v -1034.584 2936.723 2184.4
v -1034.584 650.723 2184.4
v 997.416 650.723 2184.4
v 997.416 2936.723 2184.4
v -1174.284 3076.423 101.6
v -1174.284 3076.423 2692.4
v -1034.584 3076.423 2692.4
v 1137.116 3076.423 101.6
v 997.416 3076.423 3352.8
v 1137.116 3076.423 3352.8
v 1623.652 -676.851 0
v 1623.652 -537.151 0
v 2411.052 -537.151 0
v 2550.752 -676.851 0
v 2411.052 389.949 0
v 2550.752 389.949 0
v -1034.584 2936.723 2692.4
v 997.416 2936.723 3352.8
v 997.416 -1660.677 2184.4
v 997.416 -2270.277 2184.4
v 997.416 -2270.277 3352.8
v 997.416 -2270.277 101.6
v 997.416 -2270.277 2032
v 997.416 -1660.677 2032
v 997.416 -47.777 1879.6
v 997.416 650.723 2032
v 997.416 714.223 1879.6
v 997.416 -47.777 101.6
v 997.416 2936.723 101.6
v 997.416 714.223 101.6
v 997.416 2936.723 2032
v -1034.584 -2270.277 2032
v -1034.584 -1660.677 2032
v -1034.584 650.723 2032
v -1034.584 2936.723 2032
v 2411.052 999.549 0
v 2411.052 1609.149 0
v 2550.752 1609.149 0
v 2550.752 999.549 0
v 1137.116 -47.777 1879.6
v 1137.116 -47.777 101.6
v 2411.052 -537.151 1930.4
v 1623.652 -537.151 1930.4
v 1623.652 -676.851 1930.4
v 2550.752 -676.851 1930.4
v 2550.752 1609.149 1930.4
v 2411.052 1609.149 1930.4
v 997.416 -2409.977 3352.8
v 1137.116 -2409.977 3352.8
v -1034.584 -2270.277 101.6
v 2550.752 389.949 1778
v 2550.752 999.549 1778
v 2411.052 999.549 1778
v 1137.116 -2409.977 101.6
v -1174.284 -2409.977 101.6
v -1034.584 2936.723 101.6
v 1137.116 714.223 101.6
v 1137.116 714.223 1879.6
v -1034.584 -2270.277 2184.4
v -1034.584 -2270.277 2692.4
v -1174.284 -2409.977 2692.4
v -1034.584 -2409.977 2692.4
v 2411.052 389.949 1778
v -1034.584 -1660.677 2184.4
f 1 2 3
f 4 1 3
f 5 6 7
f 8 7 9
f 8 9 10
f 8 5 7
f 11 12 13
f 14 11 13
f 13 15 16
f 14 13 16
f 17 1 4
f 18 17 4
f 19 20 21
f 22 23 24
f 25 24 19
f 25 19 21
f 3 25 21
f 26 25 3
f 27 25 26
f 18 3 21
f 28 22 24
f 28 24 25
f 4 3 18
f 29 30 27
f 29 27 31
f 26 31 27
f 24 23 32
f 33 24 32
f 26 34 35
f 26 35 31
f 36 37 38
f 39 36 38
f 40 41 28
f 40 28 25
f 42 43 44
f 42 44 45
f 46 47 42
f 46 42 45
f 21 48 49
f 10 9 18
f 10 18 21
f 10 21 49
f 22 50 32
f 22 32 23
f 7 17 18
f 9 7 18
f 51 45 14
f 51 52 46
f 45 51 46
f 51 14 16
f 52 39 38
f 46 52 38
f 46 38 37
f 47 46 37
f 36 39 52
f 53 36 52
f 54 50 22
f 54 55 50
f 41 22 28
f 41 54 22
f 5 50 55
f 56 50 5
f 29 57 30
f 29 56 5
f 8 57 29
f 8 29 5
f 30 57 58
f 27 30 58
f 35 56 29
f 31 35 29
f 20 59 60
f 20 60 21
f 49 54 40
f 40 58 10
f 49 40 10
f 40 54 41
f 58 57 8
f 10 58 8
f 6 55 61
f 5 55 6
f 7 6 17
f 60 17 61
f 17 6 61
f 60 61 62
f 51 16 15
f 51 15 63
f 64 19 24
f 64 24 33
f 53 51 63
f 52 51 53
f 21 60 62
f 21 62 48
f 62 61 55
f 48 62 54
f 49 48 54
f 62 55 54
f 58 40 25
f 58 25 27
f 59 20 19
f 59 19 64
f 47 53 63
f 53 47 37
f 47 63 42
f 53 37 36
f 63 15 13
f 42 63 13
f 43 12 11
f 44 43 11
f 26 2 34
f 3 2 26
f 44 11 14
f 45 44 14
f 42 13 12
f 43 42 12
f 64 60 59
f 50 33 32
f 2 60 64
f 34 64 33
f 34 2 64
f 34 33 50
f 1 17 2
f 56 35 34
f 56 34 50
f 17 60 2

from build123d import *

# Parameters (mm, degrees)
F0_W      = 2311.4
F0_H      = 5486.4
F0_W_2    = 2032
F0_H_2    = 5207
F1_DEPTH  = 3352.8
F2_W      = 2032
F2_H      = 152.4
F3_DEPTH  = 2286
F4_DEPTH  = 139.7
F5_DEPTH  = 5473.7
F6_W      = 139.7
F6_H      = 660.4
F7_DEPTH  = 5486.4
F8_W      = 2032
F8_H      = 152.4
F9_DEPTH  = 609.6
F10_W     = 5486.4
F10_H     = 101.6
F11_DEPTH = 2311.4
F13_DEPTH = 1930.4
F14_W     = 609.6
F14_H     = 1778
F15_DEPTH = 139.7
F16_W     = 762
F16_H     = 1778
F17_DEPTH = 139.7


with BuildPart() as f1:
    # F0 (on Top) → F1 (new body)
    with BuildSketch(Plane.XY):
        with Locations((-18.584356, 333.222617)):
            Rectangle(F0_W, F0_H)
        with Locations((-18.584356, 333.222617)):
            Rectangle(F0_W_2, F0_H_2, mode=Mode.SUBTRACT)
    extrude(amount=F1_DEPTH)

    # F2 (on face) → F3 (join)
    with BuildSketch(Plane.XZ.offset(-2936.722617)):
        with Locations((-18.584356, 2108.2)):
            Rectangle(F2_W, F2_H)
    extrude(amount=F3_DEPTH)

    # F2 (on face) → F4 (cut)
    with BuildSketch(Plane.XZ.offset(-2936.722617)):
        Polygon((-1034.584356, 3352.8), (-1034.584356, 2692.4), (997.415644, 3352.8), align=None)
    extrude(amount=-F4_DEPTH, mode=Mode.SUBTRACT)

    # F2 (on face) → F5 (cut)
    with BuildSketch(Plane.XZ.offset(-2936.722617)):
        Polygon((-1034.584356, 3352.8), (-1034.584356, 2692.4), (997.415644, 3352.8), align=None)
    extrude(amount=F5_DEPTH, mode=Mode.SUBTRACT)

    # F6 (on face) → F7 (cut)
    with BuildSketch(Plane.XZ.offset(2409.977383)):
        with Locations((-1104.434356, 3022.6)):
            Rectangle(F6_W, F6_H)
    extrude(amount=-F7_DEPTH, mode=Mode.SUBTRACT)

    # F8 (on face) → F9 (join)
    with BuildSketch(Plane(origin=(0, -2270.277383, 0), x_dir=(-1, 0, 0), z_dir=(0, 1, 0))):
        with Locations((18.584356, 2108.2)):
            Rectangle(F8_W, F8_H)
    extrude(amount=F9_DEPTH)

    # F10 (on face) → F11 (cut)
    with BuildSketch(Plane.YZ.offset(1137.115644)):
        with Locations((333.222617, 50.8)):
            Rectangle(F10_W, F10_H)
    extrude(amount=-F11_DEPTH, mode=Mode.SUBTRACT)

    # F16 (on face) → F17 (cut)
    with BuildSketch(Plane.YZ.offset(1137.115644)):
        with Locations((333.222617, 990.6)):
            Rectangle(F16_W, F16_H)
    extrude(amount=-F17_DEPTH, mode=Mode.SUBTRACT)


with BuildPart() as f13:
    # F12 (on Top) → F13 (new body)
    with BuildSketch(Plane.XY):
        Polygon((2550.75182, 1609.148992), (2411.05182, 1609.148992), (2411.05182, -537.151008), (1623.65182, -537.151008), (1623.65182, -676.851008), (2550.75182, -676.851008), align=None)
    extrude(amount=F13_DEPTH)

    # F14 (on face) → F15 (cut)
    with BuildSketch(Plane.YZ.offset(2550.75182)):
        with Locations((694.748992, 889)):
            Rectangle(F14_W, F14_H)
    extrude(amount=-F15_DEPTH, mode=Mode.SUBTRACT)


solid = Compound([f1.part, f13.part])
